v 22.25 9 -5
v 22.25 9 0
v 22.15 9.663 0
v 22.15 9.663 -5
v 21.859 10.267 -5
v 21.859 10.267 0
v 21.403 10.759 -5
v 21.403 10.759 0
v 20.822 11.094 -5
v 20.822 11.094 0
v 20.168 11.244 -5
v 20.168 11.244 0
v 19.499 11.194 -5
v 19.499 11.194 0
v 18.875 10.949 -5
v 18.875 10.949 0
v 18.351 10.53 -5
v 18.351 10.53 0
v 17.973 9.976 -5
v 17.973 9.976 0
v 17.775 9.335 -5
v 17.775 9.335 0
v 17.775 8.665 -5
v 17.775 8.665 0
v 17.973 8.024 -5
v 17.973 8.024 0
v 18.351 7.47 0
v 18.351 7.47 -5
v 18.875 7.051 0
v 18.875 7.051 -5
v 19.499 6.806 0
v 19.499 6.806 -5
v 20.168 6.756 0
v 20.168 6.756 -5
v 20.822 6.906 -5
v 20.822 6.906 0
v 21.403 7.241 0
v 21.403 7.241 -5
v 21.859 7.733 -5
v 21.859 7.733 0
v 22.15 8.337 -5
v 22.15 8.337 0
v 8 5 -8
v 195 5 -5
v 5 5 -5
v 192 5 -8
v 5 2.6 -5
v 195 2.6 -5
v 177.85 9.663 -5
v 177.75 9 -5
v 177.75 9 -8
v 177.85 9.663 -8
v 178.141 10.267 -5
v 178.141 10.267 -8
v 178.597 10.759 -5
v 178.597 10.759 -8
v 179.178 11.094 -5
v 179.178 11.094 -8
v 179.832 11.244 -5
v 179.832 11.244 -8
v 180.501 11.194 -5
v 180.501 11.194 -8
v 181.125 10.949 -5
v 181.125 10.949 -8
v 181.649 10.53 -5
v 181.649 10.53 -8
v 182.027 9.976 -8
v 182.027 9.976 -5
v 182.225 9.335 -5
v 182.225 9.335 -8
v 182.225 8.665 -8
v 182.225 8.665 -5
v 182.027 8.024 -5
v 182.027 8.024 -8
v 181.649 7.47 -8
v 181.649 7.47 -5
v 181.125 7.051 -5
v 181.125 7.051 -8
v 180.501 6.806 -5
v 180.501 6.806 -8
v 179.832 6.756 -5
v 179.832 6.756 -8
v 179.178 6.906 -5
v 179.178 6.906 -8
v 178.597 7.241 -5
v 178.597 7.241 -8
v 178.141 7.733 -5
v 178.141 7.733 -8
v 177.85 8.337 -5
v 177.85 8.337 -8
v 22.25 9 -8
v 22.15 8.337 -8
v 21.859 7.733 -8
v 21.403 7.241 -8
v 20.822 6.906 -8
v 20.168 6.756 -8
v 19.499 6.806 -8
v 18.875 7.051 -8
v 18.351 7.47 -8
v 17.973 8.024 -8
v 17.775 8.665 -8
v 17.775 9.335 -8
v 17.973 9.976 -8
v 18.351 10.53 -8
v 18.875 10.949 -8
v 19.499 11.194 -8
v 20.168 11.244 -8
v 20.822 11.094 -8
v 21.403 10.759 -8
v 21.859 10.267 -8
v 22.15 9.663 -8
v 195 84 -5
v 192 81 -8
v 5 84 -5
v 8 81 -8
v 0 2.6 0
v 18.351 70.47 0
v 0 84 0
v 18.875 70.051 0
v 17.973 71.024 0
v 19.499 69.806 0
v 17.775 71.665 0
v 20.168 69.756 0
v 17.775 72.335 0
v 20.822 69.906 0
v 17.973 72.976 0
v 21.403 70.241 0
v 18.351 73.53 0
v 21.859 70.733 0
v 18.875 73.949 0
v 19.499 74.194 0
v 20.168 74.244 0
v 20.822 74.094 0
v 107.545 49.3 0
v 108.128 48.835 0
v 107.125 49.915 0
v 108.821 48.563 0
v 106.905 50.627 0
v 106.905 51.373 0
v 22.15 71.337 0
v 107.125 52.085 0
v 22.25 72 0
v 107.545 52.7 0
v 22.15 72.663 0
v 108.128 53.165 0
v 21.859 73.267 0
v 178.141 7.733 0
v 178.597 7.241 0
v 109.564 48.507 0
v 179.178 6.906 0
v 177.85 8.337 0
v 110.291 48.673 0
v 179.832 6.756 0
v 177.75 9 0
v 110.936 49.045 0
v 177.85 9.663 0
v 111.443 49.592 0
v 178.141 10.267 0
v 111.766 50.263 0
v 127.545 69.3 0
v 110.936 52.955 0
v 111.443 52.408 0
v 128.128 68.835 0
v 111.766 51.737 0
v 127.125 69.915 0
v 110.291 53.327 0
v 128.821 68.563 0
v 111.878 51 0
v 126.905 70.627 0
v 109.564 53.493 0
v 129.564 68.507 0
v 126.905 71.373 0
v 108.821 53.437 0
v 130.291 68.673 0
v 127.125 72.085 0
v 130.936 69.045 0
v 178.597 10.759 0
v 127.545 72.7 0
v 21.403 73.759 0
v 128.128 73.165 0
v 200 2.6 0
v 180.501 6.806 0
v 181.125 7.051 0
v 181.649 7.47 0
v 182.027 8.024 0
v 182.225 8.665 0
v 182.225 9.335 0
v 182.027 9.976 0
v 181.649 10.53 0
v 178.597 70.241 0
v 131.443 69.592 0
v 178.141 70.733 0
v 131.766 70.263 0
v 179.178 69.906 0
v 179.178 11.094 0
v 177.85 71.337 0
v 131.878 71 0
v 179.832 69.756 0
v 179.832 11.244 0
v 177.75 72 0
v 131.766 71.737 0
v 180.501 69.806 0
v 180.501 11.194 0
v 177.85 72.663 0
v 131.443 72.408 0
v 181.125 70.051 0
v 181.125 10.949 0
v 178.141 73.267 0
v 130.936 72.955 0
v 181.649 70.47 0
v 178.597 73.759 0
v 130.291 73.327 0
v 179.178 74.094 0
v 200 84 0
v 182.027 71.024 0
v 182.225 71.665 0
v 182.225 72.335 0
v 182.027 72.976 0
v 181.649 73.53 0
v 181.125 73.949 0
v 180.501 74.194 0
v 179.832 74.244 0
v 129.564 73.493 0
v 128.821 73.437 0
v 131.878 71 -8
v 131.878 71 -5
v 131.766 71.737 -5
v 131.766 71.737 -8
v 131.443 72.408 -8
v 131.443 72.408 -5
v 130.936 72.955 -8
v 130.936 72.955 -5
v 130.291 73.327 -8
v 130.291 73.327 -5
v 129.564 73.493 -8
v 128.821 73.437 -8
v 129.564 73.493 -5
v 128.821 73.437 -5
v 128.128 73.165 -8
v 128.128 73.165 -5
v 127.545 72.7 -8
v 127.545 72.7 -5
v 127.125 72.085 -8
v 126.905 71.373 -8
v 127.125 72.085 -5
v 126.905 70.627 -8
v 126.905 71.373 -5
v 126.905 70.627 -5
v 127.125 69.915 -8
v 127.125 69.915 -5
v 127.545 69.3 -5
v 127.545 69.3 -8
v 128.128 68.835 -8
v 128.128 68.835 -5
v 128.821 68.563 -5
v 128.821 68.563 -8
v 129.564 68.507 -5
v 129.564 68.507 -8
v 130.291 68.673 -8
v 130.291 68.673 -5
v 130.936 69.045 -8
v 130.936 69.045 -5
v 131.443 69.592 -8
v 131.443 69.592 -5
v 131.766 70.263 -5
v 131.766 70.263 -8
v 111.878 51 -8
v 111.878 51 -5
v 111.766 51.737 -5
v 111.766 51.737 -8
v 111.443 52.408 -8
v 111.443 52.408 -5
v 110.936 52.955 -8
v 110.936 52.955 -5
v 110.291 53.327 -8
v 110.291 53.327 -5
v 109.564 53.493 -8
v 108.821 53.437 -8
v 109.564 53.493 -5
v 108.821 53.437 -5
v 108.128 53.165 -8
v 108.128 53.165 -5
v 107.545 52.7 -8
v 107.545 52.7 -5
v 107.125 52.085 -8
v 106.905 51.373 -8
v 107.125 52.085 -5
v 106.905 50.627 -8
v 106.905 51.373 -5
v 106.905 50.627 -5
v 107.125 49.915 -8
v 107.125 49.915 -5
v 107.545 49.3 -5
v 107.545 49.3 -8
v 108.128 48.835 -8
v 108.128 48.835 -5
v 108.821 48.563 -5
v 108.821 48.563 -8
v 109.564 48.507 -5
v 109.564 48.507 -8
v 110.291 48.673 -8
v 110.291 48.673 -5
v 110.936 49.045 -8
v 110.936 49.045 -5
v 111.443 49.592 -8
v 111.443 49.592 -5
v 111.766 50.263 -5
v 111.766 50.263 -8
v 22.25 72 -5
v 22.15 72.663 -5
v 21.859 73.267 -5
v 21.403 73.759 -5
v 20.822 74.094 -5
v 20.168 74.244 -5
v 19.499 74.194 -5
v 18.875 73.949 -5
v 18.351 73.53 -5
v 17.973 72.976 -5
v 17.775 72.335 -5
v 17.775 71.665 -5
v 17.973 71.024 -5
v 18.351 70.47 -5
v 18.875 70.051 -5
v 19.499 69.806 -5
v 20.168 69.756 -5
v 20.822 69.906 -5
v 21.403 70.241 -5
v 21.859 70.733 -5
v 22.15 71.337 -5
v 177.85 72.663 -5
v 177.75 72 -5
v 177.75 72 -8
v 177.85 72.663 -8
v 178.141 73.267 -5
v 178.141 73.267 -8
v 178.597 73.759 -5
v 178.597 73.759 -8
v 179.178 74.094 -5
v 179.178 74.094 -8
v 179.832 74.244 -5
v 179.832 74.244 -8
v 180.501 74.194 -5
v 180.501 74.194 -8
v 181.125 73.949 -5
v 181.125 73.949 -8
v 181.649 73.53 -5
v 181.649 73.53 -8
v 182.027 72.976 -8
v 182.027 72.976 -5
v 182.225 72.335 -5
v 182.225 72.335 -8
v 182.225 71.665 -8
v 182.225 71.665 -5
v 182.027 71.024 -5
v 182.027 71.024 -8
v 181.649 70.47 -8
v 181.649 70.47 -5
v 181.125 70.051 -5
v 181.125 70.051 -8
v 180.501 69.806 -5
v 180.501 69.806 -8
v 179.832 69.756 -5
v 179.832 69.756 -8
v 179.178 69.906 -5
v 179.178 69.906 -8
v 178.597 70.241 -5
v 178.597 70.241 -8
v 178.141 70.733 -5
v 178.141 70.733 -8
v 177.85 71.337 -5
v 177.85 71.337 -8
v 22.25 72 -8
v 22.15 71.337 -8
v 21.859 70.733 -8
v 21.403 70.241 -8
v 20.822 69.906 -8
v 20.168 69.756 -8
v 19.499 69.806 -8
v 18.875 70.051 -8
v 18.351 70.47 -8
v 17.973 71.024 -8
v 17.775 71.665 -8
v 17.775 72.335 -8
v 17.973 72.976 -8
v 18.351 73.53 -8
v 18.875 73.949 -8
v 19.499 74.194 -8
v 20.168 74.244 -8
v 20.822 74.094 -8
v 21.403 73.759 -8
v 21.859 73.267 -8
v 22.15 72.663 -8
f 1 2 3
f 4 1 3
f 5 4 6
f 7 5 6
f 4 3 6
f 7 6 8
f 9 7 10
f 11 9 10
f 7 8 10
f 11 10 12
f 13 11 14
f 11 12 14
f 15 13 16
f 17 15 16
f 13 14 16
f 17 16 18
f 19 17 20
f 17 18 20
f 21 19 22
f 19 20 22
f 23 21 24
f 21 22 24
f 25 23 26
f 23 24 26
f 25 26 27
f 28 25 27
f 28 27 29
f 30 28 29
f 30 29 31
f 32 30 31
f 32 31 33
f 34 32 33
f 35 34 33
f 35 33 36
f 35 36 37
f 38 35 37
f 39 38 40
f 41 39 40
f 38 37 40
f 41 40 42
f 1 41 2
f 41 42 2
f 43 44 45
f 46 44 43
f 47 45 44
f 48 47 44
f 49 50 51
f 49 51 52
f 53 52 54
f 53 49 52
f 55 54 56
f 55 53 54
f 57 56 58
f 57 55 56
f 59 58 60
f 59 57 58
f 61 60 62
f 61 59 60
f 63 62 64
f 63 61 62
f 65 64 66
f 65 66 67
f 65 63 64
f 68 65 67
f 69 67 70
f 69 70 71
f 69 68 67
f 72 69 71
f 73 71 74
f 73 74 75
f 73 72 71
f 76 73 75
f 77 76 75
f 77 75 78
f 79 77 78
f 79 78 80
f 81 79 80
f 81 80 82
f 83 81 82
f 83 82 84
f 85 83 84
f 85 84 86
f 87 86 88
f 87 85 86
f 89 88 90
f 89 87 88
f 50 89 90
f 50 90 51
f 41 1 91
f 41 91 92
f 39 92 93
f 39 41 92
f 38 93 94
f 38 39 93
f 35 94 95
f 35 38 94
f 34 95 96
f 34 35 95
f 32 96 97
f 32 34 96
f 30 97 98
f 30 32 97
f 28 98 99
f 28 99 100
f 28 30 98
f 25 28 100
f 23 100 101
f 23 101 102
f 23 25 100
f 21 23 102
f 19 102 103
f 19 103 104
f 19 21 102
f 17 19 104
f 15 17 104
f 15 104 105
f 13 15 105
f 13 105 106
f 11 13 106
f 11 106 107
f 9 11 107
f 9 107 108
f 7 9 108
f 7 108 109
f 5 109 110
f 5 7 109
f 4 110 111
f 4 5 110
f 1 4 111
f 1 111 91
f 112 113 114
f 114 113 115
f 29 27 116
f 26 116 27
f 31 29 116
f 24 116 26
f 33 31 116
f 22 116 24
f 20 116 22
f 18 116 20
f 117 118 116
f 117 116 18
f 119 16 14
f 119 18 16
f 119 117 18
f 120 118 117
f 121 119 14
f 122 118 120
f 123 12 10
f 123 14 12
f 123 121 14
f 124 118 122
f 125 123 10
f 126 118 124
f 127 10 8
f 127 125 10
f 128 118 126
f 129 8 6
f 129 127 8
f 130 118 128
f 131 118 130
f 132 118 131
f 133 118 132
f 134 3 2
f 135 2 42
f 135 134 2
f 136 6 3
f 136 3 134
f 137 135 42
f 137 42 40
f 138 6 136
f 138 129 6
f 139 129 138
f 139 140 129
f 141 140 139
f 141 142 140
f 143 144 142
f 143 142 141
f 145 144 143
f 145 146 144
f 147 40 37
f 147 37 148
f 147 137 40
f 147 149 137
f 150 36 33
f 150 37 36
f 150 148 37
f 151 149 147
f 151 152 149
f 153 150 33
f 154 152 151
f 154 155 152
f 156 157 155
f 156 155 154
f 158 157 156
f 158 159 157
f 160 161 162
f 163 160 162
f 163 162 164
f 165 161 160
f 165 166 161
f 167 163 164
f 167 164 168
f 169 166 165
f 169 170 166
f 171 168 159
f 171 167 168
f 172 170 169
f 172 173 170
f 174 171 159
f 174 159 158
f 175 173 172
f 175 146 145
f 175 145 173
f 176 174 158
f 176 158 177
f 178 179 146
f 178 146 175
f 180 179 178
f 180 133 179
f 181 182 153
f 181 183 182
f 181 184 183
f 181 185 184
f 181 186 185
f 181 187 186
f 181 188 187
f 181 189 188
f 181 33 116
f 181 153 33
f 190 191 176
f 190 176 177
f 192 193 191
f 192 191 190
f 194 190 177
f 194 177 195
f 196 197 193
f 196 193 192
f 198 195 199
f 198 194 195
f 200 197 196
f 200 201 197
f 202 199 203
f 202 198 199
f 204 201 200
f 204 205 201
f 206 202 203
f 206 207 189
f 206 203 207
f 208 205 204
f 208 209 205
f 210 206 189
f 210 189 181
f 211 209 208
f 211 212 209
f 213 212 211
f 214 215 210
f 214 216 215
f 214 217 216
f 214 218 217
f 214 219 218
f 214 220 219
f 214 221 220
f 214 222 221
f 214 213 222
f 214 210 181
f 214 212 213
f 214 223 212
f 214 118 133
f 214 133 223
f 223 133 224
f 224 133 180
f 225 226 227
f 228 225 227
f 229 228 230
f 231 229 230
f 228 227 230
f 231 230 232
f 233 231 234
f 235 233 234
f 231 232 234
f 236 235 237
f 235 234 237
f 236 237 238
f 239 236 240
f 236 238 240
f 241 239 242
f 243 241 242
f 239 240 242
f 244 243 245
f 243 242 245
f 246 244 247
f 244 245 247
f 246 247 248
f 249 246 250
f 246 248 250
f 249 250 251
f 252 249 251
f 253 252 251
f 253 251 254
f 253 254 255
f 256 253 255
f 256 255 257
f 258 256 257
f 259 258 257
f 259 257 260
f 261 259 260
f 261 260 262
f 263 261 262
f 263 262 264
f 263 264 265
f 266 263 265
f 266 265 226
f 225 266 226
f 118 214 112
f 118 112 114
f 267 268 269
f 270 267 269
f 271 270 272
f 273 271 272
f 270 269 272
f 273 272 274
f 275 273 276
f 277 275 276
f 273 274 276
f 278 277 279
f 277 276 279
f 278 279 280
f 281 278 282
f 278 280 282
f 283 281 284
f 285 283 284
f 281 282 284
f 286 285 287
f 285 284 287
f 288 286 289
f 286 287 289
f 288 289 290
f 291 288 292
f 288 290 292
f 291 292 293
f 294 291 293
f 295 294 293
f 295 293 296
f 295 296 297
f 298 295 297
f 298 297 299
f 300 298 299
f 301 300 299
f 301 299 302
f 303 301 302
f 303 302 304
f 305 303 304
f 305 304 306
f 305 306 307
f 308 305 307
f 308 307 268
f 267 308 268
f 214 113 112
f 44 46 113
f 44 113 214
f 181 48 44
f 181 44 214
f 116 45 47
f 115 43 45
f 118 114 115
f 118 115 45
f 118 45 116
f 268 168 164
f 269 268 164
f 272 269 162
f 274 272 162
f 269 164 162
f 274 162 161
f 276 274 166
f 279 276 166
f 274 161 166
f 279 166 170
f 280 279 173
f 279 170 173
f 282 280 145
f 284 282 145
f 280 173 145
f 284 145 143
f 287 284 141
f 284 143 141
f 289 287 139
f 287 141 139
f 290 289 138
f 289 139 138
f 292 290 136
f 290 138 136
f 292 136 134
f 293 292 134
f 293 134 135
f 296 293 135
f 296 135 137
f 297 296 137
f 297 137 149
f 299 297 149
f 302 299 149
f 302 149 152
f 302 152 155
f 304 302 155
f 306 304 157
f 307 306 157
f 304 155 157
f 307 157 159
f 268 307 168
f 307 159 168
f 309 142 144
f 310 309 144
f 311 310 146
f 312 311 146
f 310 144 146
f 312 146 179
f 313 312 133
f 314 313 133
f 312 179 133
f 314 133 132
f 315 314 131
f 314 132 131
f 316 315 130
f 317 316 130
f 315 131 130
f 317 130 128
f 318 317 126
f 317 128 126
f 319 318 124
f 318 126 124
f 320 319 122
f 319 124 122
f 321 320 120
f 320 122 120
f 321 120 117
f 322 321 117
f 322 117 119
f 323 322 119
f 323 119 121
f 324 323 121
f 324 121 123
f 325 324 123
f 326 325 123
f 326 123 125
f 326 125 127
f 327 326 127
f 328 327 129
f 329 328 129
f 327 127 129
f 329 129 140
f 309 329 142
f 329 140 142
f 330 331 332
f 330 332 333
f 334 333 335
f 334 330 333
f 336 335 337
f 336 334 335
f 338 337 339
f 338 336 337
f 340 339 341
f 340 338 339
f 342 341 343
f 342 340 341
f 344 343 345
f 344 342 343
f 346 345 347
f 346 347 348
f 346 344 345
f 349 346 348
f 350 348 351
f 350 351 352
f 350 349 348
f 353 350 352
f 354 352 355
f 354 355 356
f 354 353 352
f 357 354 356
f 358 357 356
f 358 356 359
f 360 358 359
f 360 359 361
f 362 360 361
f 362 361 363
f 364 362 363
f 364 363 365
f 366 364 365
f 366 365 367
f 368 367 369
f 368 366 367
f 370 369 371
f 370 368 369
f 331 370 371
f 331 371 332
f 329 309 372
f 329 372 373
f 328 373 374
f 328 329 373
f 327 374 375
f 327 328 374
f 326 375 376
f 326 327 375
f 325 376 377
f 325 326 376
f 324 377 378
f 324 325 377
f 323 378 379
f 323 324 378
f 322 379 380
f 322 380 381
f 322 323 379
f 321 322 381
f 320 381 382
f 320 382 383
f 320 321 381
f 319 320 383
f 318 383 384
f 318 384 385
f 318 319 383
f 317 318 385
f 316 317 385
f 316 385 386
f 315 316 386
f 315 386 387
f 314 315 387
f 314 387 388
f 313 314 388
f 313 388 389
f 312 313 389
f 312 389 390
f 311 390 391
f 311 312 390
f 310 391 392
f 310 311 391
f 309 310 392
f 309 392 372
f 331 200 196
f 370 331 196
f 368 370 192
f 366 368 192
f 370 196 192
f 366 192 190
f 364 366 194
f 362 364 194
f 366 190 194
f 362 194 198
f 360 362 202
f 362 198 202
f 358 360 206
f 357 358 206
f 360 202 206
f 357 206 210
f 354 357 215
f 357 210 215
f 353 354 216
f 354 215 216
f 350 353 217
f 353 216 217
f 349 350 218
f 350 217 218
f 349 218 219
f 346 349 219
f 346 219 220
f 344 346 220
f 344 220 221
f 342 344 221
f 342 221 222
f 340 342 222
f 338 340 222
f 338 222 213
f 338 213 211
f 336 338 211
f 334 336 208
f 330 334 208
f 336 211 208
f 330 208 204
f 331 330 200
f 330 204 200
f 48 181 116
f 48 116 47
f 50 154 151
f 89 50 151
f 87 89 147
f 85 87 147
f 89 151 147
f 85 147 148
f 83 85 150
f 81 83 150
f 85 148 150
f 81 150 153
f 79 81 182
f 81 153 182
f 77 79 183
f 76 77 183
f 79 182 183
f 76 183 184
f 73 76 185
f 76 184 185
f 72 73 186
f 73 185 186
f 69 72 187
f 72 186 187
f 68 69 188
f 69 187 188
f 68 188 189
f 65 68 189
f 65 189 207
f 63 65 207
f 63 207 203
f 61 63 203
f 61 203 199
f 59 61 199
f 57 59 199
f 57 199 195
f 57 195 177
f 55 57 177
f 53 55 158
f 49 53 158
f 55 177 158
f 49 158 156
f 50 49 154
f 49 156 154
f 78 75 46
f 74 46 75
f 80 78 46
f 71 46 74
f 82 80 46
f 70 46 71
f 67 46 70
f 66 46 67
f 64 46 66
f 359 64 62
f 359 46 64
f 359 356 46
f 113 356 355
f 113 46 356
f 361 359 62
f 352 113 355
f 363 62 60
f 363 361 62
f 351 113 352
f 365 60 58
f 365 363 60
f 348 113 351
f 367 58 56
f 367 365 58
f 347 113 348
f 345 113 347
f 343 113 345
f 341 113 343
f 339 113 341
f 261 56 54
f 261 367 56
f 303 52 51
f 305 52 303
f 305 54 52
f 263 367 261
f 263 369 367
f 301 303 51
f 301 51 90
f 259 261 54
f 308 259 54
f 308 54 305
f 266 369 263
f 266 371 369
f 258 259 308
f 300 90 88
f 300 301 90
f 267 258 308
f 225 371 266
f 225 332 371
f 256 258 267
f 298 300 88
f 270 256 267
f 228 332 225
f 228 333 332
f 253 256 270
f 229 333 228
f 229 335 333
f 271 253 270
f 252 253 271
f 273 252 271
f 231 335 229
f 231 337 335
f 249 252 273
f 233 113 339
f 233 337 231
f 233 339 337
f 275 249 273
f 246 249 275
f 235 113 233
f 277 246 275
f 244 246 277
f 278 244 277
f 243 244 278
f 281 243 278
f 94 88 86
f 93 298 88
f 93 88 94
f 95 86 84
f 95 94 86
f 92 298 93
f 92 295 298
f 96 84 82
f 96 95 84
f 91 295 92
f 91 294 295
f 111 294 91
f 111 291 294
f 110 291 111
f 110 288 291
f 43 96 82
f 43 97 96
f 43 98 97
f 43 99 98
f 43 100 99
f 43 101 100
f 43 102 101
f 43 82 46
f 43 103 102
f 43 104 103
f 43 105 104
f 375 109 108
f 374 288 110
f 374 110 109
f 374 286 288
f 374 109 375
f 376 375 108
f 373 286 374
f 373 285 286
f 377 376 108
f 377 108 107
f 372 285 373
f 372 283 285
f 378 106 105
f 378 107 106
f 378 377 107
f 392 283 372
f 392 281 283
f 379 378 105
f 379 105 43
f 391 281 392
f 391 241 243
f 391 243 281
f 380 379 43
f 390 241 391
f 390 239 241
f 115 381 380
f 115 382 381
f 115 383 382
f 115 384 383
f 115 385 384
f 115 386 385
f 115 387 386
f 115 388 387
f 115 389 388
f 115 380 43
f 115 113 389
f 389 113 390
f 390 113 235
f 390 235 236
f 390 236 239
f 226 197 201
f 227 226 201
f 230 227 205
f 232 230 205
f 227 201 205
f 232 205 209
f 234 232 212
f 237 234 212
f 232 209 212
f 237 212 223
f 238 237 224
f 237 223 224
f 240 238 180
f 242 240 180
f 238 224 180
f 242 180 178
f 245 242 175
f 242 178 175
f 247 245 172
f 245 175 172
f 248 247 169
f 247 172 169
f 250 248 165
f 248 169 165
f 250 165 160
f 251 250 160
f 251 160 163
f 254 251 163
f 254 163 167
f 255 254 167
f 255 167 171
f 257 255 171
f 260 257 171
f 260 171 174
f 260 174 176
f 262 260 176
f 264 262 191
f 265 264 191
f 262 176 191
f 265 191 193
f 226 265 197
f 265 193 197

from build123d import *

# Parameters (mm, degrees)
SKETCH1_W           = 200
SKETCH1_H           = 84
SKETCH1_R           = 2.25
SKETCH1_R_2         = 2.5
BOSS_EXTRUDE1_DEPTH = 5
SKETCH2_W           = 200
SKETCH2_H           = 79
SKETCH2_R           = 2.25
BOSS_EXTRUDE2_DEPTH = 3
CHAMFER1_SIZE       = 8
CHAMFER3_SIZE       = 3
SKETCH3_W           = 7.071067812
SKETCH3_H           = 2.6
CUT_EXTRUDE1_DEPTH  = 234.034075139
SKETCH4_R           = 2.5
CUT_EXTRUDE2_DEPTH  = 218.071416819


with BuildPart() as part:
    # Sketch1 → Boss-Extrude1 (new body)
    with BuildSketch(Plane.XY):
        with Locations((100, 42)):
            Rectangle(SKETCH1_W, SKETCH1_H)
        with Locations((20, 9)):
            Circle(SKETCH1_R, mode=Mode.SUBTRACT)
        with Locations(Location((180, 9, 0), (0, 0, 180))):
            Circle(SKETCH1_R, mode=Mode.SUBTRACT)
        with Locations((20, 72)):
            Circle(SKETCH1_R, mode=Mode.SUBTRACT)
        with Locations(Location((180, 72, 0), (0, 0, 180))):
            Circle(SKETCH1_R, mode=Mode.SUBTRACT)
        with Locations((109.377508284, 51)):
            Circle(SKETCH1_R_2, mode=Mode.SUBTRACT)
        with Locations((129.377508284, 71)):
            Circle(SKETCH1_R_2, mode=Mode.SUBTRACT)
    extrude(amount=-BOSS_EXTRUDE1_DEPTH)

    # Sketch2 → Boss-Extrude2 (add)
    with BuildSketch(Plane(origin=(0, 0, -5), x_dir=(-1, 0, 0), z_dir=(0, 0, -1))):
        with Locations((-100, 44.5)):
            Rectangle(SKETCH2_W, SKETCH2_H)
        with Locations(Location((-20, 9, 0), (0, 0, 180))):
            Circle(SKETCH2_R, mode=Mode.SUBTRACT)
        with Locations((-180, 9)):
            Circle(SKETCH2_R, mode=Mode.SUBTRACT)
        with Locations(Location((-20, 72, 0), (0, 0, 180))):
            Circle(SKETCH2_R, mode=Mode.SUBTRACT)
        with Locations((-180, 72)):
            Circle(SKETCH2_R, mode=Mode.SUBTRACT)
    extrude(amount=BOSS_EXTRUDE2_DEPTH)

    # Chamfer1
    # the kernel refuses this chamfer: 8 mm, written as the material it takes off along each edge
    with BuildSketch(Plane(origin=(200, -15.573463904, -8), x_dir=(-0.9996219169112968, 0, -0.027495876610586296), z_dir=(0, 1, 0)), Plane(origin=(0, 104.573463904, -8), x_dir=(0.9996219169112968, 0, -0.027495876610586275), z_dir=(0, -1, 0))) as chamfer1_piece_1:
        Polygon((CHAMFER1_SIZE * 0.999621916911, CHAMFER1_SIZE * 0.0274958766106), (-CHAMFER1_SIZE * 0.0274958766106, CHAMFER1_SIZE * 0.999621916911), (0, 0), align=None)
    extrude(amount=120.146927807, mode=Mode.SUBTRACT)

    # Chamfer3
    chamfer3_edges = [part.edges().sort_by_distance(p)[0] for p in [
        (100, 84, -8),
    ]]
    chamfer(chamfer3_edges, length=CHAMFER3_SIZE)

    # Sketch3 → Cut-Extrude1 (cut, through all, along a direction that is not the sketch's normal)
    with BuildSketch(Plane(origin=(100, 0, -100), x_dir=(-0.7071067811865452, 0, -0.7071067811865498), z_dir=(0.7071067811865498, 0, -0.7071067811865452))):
        with Locations((-137.885822331, 1.3)):
            Rectangle(SKETCH3_W, SKETCH3_H)
    extrude(amount=-CUT_EXTRUDE1_DEPTH, dir=(1, 0, 0), mode=Mode.SUBTRACT)

    # Sketch4 → Cut-Extrude2 (cut, through all)
    with BuildSketch(Plane.XY):
        with Locations((129.377508284, 71)):
            Circle(SKETCH4_R)
        with Locations((109.377508284, 51)):
            Circle(SKETCH4_R)
    extrude(amount=-CUT_EXTRUDE2_DEPTH, mode=Mode.SUBTRACT)


solid = part.part
